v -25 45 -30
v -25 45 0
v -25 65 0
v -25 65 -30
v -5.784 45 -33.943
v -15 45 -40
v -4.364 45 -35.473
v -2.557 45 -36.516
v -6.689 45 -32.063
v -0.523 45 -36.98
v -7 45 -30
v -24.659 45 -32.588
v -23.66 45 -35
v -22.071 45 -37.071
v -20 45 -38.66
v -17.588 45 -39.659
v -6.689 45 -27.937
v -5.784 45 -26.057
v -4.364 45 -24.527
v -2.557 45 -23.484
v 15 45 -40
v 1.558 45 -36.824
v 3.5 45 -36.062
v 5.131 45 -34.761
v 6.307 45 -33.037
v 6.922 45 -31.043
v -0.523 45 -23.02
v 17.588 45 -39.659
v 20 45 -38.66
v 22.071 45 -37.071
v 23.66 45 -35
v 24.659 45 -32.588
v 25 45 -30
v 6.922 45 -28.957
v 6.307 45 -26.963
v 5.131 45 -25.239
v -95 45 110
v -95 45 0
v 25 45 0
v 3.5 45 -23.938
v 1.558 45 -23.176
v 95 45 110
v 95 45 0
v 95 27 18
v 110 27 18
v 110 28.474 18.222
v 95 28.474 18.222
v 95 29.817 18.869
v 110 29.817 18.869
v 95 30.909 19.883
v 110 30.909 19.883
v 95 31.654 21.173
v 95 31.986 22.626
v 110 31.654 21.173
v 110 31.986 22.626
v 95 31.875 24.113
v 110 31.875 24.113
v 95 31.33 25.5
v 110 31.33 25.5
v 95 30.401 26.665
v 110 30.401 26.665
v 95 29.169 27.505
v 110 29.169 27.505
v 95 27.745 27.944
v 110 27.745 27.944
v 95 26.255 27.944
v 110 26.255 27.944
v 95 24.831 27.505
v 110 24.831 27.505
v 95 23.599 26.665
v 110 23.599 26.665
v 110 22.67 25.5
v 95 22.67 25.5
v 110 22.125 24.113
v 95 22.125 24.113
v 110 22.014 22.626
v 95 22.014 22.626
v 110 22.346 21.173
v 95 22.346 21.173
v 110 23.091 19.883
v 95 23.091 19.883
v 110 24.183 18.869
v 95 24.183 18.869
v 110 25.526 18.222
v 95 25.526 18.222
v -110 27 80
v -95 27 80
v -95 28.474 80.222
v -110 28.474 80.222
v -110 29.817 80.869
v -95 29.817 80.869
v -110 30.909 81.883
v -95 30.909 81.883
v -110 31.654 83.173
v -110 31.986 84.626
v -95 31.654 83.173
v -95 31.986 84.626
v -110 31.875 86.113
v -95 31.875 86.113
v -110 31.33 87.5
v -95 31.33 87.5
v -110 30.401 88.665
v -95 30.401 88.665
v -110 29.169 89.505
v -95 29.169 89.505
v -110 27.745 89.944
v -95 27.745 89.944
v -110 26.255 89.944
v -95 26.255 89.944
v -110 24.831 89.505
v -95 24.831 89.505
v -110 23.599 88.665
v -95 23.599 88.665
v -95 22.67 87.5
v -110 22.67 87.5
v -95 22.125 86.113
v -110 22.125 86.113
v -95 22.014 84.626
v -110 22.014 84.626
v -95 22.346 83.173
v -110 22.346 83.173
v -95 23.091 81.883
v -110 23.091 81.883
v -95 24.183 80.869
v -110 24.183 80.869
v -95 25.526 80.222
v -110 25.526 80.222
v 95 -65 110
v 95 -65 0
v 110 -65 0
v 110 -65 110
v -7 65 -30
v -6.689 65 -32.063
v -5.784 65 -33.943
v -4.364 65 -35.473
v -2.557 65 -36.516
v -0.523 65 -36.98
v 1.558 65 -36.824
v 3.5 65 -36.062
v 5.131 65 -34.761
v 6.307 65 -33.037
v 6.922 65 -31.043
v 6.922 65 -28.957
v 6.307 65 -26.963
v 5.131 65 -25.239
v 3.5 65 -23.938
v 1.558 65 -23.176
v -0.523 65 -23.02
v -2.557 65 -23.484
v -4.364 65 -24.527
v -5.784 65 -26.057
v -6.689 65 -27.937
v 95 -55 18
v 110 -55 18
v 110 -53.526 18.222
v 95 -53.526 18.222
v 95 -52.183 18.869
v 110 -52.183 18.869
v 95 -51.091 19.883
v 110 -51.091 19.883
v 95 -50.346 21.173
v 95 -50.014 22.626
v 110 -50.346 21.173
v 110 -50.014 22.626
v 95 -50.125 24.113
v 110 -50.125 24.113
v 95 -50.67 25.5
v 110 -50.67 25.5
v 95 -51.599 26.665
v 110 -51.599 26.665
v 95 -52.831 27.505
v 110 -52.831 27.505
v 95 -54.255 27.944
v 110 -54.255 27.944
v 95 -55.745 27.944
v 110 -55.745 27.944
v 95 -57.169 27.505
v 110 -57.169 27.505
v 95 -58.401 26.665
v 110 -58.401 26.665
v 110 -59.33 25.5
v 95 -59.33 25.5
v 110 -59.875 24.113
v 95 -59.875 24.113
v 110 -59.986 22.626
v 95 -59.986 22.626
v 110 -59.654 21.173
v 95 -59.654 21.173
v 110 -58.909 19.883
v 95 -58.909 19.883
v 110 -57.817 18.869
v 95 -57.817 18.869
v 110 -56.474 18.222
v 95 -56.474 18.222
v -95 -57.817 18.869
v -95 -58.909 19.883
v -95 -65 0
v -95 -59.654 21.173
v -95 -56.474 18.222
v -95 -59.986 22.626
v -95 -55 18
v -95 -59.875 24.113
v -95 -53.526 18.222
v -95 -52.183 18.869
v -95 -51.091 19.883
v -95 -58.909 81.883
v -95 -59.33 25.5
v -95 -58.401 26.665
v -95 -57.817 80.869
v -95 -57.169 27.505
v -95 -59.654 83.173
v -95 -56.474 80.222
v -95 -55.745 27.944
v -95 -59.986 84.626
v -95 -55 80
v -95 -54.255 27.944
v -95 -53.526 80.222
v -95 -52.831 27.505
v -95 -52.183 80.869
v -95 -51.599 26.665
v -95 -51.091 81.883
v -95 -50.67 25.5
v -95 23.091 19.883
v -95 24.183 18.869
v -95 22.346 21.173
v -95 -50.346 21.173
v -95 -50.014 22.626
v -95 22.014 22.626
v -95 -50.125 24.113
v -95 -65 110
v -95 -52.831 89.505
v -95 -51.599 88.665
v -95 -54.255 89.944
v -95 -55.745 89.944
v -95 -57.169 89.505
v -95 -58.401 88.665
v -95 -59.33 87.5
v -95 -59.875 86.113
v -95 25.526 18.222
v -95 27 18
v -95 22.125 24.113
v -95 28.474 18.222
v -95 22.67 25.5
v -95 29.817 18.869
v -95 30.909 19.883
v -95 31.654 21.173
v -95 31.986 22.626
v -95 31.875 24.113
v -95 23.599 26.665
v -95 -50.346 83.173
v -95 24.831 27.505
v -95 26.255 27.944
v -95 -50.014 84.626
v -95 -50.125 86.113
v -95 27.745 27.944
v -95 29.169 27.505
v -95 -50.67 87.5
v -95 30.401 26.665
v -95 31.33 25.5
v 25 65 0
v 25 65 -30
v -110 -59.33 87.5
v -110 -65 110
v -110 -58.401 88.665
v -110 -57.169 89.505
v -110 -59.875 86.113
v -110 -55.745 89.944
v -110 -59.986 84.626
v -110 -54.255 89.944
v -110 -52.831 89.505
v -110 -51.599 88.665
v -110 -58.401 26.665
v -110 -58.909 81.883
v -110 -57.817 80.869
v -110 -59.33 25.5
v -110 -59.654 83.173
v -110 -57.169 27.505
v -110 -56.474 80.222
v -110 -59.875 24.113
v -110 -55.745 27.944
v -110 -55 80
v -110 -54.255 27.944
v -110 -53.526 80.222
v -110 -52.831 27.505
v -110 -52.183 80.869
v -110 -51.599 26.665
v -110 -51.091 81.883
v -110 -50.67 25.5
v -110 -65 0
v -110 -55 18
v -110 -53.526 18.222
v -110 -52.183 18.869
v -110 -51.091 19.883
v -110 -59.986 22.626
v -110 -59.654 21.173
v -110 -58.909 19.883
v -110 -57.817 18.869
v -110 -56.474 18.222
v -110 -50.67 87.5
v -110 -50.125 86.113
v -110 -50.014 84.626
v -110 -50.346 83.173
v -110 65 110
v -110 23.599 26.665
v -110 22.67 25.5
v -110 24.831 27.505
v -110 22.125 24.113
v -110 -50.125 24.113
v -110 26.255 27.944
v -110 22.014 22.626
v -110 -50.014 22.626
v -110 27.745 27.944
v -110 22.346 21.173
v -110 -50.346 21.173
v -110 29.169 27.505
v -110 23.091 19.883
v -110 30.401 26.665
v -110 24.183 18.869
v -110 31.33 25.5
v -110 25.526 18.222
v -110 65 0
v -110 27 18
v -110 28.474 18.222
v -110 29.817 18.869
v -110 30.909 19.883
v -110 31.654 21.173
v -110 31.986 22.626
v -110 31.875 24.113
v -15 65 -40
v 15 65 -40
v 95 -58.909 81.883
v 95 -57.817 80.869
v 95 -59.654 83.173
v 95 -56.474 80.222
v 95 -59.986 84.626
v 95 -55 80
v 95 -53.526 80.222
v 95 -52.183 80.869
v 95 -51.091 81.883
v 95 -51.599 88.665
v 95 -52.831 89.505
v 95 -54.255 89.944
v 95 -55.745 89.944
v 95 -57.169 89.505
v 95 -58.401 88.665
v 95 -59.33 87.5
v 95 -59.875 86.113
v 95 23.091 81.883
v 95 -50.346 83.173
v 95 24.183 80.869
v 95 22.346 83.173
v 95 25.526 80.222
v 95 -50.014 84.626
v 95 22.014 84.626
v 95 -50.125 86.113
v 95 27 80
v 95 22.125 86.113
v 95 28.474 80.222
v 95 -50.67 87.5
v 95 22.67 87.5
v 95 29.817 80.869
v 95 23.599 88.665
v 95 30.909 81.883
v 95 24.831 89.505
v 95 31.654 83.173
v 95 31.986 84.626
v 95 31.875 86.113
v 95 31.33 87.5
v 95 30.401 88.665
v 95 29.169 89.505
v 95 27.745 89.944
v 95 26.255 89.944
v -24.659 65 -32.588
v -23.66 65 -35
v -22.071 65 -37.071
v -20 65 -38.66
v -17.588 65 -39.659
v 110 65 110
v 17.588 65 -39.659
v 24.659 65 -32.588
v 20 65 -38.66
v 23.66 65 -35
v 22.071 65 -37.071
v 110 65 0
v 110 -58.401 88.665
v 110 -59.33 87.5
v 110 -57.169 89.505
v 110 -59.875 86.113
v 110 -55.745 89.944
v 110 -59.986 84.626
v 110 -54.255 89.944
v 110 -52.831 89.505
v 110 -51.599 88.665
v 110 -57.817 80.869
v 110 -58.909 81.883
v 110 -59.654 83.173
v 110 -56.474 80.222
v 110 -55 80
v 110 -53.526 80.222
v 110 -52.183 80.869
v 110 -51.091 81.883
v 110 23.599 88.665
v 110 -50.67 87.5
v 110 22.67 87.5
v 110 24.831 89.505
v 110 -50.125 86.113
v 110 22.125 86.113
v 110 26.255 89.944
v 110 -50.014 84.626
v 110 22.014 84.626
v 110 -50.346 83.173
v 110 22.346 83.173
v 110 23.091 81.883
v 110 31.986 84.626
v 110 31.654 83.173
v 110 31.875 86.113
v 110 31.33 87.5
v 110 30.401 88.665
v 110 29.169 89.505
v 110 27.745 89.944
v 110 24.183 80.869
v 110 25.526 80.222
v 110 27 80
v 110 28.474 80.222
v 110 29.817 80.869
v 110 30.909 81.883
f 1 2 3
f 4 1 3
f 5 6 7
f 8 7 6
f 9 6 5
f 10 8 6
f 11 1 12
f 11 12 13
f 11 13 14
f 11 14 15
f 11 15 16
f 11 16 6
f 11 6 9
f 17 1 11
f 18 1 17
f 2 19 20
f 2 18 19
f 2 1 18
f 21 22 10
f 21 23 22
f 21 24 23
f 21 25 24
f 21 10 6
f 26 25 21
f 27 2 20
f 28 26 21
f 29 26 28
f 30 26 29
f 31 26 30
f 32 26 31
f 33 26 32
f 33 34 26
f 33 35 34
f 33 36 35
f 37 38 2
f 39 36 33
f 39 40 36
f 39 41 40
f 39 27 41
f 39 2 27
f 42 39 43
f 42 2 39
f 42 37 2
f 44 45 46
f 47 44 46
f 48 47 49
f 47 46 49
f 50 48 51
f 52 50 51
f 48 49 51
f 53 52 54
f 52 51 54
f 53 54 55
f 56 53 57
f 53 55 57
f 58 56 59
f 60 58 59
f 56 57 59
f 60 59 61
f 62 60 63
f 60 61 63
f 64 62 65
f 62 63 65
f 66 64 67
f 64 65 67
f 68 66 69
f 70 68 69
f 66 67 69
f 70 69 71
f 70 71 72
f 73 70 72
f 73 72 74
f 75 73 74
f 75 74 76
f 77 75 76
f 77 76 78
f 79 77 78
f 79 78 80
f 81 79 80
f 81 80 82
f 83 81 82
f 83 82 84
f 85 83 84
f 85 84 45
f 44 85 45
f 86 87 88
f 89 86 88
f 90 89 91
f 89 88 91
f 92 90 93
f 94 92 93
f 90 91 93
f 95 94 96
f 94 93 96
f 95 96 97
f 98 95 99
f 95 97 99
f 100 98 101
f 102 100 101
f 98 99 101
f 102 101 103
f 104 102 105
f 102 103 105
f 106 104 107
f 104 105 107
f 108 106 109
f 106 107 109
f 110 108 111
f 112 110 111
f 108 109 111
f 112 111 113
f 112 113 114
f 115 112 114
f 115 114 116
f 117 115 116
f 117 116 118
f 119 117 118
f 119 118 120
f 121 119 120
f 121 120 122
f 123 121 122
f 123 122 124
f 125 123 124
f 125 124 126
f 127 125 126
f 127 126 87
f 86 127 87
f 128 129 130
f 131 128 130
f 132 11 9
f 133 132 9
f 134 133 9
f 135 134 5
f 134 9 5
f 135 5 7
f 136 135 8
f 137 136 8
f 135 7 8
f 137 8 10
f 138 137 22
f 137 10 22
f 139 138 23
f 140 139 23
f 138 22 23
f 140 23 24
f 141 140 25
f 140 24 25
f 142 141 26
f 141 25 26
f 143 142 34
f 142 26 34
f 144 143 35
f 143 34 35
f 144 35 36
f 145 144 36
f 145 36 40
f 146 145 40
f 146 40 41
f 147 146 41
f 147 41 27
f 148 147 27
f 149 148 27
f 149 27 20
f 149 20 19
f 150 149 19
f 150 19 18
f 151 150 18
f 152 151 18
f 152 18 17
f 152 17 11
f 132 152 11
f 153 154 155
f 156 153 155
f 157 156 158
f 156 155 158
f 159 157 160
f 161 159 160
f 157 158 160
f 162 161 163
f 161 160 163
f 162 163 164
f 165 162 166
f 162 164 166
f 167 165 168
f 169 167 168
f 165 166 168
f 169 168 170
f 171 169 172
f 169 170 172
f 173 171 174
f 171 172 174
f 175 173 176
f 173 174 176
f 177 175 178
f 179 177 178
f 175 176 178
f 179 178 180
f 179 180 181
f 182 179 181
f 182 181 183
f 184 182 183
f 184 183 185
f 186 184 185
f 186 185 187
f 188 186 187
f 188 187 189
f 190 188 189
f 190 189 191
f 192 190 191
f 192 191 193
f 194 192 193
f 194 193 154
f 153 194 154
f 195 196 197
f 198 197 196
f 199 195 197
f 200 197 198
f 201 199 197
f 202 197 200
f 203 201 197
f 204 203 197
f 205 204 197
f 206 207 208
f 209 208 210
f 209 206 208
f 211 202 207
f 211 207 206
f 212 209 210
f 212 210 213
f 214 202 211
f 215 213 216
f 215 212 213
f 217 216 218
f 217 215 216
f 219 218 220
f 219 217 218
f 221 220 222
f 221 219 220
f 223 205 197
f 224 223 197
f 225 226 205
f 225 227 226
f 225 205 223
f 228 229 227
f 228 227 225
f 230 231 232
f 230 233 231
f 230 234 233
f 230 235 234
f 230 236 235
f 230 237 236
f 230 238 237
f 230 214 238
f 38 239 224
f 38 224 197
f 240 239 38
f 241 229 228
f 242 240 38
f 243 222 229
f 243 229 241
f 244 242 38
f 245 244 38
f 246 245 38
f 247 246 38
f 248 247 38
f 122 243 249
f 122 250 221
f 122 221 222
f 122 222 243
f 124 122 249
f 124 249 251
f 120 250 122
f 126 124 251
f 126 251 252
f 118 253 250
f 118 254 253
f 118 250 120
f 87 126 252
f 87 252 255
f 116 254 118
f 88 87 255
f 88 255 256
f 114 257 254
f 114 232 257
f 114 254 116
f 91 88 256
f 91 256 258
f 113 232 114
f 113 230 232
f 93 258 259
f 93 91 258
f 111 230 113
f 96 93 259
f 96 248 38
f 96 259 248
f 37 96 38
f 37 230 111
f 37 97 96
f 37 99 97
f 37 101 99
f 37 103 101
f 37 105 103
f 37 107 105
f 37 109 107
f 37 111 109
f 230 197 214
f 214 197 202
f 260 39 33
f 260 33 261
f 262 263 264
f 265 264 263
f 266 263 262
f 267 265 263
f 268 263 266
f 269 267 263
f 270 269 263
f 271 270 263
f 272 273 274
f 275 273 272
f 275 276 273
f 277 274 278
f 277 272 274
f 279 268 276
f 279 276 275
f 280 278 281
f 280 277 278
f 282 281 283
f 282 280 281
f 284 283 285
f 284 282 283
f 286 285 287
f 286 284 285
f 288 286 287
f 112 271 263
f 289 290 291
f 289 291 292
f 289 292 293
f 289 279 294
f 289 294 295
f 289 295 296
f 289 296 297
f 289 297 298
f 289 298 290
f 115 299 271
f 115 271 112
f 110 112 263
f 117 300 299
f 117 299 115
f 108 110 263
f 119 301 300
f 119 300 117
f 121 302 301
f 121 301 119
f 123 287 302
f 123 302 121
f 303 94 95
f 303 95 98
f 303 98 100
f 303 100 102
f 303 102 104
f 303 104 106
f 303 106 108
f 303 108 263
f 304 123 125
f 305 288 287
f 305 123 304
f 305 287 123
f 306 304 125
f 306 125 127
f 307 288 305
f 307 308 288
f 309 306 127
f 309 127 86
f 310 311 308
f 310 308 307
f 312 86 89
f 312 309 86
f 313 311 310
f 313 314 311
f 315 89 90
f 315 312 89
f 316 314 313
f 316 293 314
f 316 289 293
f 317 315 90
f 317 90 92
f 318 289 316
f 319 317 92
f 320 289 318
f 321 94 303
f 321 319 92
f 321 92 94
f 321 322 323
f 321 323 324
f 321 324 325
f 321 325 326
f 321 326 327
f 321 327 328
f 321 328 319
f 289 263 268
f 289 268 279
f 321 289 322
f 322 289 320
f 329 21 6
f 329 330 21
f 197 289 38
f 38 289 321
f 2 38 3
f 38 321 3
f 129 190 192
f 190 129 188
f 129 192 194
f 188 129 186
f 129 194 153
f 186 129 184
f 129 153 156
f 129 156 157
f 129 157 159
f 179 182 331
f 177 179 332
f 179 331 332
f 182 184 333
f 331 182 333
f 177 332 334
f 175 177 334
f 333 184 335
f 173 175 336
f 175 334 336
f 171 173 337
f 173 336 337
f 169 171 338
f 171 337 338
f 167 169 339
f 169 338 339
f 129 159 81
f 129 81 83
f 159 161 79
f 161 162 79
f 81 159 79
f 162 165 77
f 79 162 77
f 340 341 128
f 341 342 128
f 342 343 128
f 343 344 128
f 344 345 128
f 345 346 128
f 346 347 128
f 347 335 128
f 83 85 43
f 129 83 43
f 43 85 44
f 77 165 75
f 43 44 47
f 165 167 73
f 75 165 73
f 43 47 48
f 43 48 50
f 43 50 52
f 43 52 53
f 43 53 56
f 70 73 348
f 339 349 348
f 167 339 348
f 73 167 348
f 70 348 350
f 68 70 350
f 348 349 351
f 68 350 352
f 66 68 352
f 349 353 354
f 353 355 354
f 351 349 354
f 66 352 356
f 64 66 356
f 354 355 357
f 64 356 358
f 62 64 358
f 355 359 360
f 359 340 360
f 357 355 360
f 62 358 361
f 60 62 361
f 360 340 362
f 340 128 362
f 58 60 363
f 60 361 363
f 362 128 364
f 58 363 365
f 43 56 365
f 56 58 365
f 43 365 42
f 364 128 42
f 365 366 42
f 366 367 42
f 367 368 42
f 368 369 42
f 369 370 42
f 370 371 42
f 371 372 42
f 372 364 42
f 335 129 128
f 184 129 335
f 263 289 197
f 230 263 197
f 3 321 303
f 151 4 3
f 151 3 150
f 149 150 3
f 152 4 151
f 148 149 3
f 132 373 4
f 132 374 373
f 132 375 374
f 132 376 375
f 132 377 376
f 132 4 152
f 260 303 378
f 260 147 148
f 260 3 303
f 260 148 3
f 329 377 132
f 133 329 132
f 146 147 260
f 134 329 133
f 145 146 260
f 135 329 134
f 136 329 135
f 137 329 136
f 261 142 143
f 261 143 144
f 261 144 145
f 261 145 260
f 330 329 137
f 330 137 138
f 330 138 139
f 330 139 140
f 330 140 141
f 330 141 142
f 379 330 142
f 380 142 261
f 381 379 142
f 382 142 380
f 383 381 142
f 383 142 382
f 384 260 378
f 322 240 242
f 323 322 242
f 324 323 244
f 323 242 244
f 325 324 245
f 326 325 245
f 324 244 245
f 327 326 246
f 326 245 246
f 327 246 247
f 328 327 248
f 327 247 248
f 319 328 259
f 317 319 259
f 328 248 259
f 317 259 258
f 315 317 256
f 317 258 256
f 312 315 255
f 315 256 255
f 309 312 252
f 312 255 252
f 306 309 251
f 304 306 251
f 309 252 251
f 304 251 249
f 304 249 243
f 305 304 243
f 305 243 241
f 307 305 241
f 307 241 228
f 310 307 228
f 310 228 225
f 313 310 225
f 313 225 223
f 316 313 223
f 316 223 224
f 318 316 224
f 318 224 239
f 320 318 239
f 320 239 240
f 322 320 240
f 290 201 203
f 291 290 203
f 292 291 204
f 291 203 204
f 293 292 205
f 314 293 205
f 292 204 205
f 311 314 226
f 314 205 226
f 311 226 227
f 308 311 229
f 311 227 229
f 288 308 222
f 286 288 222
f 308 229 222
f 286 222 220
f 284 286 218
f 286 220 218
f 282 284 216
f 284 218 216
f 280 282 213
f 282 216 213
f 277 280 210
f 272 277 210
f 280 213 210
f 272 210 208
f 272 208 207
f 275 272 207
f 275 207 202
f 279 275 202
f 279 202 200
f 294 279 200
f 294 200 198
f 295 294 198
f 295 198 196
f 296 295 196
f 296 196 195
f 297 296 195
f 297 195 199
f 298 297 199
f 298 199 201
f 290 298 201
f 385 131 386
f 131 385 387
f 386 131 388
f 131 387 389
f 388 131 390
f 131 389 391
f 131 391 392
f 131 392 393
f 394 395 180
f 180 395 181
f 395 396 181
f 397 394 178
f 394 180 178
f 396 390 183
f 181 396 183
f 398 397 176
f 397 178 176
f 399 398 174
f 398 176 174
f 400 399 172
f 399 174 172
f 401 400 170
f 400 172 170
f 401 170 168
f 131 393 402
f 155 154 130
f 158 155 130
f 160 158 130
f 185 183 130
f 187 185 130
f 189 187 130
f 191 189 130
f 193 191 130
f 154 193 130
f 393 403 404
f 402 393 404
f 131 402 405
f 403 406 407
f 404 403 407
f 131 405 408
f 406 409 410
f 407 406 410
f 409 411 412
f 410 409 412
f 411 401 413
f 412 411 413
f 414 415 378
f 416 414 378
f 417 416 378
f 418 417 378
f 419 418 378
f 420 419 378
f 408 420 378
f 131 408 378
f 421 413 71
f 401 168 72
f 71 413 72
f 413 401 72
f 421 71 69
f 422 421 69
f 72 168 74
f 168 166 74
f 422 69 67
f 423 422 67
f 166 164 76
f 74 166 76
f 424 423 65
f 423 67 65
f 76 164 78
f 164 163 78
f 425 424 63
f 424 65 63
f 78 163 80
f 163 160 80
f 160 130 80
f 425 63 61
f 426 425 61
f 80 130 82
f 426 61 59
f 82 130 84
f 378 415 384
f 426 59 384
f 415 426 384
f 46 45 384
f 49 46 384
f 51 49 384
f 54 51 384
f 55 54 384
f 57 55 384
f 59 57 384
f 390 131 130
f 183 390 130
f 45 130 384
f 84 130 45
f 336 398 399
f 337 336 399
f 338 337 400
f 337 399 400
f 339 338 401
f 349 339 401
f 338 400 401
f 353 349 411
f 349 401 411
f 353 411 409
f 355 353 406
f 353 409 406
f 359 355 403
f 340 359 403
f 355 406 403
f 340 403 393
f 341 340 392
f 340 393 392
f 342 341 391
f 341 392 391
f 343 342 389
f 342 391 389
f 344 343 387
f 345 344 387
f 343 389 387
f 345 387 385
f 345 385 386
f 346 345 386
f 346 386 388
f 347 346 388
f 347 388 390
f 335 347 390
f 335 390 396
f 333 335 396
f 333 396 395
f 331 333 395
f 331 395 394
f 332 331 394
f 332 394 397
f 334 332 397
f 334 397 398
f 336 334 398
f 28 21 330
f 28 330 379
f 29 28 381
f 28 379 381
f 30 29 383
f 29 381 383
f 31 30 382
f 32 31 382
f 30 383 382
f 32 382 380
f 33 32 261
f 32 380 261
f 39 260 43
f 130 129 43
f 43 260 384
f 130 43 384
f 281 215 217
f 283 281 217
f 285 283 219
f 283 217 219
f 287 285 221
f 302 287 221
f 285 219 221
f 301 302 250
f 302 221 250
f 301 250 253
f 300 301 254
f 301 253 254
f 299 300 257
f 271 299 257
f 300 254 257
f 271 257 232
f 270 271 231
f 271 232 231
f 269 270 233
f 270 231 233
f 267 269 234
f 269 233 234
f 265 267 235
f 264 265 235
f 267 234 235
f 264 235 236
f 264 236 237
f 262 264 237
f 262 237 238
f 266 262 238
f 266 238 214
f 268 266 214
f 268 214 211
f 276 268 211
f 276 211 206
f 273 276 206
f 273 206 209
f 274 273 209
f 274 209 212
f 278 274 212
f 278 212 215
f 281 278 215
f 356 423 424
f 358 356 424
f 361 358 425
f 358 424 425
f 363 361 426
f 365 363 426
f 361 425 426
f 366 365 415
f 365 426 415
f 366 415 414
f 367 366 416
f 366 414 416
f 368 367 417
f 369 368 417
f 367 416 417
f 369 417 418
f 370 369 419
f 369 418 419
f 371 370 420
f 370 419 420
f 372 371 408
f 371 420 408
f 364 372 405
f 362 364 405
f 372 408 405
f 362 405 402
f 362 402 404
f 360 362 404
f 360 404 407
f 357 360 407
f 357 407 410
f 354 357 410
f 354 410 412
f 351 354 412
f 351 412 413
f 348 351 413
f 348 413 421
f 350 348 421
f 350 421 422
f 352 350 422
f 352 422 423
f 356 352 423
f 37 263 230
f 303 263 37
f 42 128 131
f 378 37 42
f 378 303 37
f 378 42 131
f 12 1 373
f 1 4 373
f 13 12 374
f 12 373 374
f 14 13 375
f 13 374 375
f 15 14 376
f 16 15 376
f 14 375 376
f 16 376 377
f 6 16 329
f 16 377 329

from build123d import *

# Parameters (mm, degrees)
SKETCH_1_W          = 220
SKETCH_1_H          = 130
EXTRUDE_1_DEPTH     = 110
SKETCH_2_W          = 190
SKETCH_2_H          = 110
CUT_EXTRUDE_1_DEPTH = 169.597153001
ST9_5_1_D           = 10
SKETCH_5_W          = 50
SKETCH_5_H          = 20
EXTRUDE_2_DEPTH     = 40
HOLE_WIZARD_M16_1_D = 14
FILLET_1_R          = 10


with BuildPart() as part:
    # 草图1 → 凸台-拉伸1 (new body)
    with BuildSketch(Plane.XY):
        Rectangle(SKETCH_1_W, SKETCH_1_H)
    extrude(amount=EXTRUDE_1_DEPTH)

    # 草图2 → 切除-拉伸1 (cut, through all)
    with BuildSketch(Plane.XY.offset(110)):
        with Locations((0, -10)):
            Rectangle(SKETCH_2_W, SKETCH_2_H)
    extrude(amount=-CUT_EXTRUDE_1_DEPTH, mode=Mode.SUBTRACT)

    # ST9.5 间隙孔1 (through all)
    with Locations(Plane.ZY.offset(110)):
        with Locations((23, 27), (85, 27), (85, -55), (23, -55)):
            Hole(ST9_5_1_D / 2)

    # 草图5 → 凸台-拉伸2 (add)
    with BuildSketch(Plane(origin=(0, 0, 0), x_dir=(-1, 0, 0), z_dir=(0, 0, -1))):
        with Locations((0, 55)):
            Rectangle(SKETCH_5_W, SKETCH_5_H)
    extrude(amount=EXTRUDE_2_DEPTH)

    # M16 螺纹孔1 (through all)
    with Locations(Plane(origin=(0, 65, 0), x_dir=(1, 0, 0), z_dir=(0, 1, 0))):
        with Locations((0, 30)):
            Hole(HOLE_WIZARD_M16_1_D / 2)

    # 圆角1
    fillet_1_edges = [part.edges().sort_by_distance(p)[0] for p in [
        (25, 55, -40),
        (-25, 55, -40),
    ]]
    fillet(fillet_1_edges, radius=FILLET_1_R)


solid = part.part
